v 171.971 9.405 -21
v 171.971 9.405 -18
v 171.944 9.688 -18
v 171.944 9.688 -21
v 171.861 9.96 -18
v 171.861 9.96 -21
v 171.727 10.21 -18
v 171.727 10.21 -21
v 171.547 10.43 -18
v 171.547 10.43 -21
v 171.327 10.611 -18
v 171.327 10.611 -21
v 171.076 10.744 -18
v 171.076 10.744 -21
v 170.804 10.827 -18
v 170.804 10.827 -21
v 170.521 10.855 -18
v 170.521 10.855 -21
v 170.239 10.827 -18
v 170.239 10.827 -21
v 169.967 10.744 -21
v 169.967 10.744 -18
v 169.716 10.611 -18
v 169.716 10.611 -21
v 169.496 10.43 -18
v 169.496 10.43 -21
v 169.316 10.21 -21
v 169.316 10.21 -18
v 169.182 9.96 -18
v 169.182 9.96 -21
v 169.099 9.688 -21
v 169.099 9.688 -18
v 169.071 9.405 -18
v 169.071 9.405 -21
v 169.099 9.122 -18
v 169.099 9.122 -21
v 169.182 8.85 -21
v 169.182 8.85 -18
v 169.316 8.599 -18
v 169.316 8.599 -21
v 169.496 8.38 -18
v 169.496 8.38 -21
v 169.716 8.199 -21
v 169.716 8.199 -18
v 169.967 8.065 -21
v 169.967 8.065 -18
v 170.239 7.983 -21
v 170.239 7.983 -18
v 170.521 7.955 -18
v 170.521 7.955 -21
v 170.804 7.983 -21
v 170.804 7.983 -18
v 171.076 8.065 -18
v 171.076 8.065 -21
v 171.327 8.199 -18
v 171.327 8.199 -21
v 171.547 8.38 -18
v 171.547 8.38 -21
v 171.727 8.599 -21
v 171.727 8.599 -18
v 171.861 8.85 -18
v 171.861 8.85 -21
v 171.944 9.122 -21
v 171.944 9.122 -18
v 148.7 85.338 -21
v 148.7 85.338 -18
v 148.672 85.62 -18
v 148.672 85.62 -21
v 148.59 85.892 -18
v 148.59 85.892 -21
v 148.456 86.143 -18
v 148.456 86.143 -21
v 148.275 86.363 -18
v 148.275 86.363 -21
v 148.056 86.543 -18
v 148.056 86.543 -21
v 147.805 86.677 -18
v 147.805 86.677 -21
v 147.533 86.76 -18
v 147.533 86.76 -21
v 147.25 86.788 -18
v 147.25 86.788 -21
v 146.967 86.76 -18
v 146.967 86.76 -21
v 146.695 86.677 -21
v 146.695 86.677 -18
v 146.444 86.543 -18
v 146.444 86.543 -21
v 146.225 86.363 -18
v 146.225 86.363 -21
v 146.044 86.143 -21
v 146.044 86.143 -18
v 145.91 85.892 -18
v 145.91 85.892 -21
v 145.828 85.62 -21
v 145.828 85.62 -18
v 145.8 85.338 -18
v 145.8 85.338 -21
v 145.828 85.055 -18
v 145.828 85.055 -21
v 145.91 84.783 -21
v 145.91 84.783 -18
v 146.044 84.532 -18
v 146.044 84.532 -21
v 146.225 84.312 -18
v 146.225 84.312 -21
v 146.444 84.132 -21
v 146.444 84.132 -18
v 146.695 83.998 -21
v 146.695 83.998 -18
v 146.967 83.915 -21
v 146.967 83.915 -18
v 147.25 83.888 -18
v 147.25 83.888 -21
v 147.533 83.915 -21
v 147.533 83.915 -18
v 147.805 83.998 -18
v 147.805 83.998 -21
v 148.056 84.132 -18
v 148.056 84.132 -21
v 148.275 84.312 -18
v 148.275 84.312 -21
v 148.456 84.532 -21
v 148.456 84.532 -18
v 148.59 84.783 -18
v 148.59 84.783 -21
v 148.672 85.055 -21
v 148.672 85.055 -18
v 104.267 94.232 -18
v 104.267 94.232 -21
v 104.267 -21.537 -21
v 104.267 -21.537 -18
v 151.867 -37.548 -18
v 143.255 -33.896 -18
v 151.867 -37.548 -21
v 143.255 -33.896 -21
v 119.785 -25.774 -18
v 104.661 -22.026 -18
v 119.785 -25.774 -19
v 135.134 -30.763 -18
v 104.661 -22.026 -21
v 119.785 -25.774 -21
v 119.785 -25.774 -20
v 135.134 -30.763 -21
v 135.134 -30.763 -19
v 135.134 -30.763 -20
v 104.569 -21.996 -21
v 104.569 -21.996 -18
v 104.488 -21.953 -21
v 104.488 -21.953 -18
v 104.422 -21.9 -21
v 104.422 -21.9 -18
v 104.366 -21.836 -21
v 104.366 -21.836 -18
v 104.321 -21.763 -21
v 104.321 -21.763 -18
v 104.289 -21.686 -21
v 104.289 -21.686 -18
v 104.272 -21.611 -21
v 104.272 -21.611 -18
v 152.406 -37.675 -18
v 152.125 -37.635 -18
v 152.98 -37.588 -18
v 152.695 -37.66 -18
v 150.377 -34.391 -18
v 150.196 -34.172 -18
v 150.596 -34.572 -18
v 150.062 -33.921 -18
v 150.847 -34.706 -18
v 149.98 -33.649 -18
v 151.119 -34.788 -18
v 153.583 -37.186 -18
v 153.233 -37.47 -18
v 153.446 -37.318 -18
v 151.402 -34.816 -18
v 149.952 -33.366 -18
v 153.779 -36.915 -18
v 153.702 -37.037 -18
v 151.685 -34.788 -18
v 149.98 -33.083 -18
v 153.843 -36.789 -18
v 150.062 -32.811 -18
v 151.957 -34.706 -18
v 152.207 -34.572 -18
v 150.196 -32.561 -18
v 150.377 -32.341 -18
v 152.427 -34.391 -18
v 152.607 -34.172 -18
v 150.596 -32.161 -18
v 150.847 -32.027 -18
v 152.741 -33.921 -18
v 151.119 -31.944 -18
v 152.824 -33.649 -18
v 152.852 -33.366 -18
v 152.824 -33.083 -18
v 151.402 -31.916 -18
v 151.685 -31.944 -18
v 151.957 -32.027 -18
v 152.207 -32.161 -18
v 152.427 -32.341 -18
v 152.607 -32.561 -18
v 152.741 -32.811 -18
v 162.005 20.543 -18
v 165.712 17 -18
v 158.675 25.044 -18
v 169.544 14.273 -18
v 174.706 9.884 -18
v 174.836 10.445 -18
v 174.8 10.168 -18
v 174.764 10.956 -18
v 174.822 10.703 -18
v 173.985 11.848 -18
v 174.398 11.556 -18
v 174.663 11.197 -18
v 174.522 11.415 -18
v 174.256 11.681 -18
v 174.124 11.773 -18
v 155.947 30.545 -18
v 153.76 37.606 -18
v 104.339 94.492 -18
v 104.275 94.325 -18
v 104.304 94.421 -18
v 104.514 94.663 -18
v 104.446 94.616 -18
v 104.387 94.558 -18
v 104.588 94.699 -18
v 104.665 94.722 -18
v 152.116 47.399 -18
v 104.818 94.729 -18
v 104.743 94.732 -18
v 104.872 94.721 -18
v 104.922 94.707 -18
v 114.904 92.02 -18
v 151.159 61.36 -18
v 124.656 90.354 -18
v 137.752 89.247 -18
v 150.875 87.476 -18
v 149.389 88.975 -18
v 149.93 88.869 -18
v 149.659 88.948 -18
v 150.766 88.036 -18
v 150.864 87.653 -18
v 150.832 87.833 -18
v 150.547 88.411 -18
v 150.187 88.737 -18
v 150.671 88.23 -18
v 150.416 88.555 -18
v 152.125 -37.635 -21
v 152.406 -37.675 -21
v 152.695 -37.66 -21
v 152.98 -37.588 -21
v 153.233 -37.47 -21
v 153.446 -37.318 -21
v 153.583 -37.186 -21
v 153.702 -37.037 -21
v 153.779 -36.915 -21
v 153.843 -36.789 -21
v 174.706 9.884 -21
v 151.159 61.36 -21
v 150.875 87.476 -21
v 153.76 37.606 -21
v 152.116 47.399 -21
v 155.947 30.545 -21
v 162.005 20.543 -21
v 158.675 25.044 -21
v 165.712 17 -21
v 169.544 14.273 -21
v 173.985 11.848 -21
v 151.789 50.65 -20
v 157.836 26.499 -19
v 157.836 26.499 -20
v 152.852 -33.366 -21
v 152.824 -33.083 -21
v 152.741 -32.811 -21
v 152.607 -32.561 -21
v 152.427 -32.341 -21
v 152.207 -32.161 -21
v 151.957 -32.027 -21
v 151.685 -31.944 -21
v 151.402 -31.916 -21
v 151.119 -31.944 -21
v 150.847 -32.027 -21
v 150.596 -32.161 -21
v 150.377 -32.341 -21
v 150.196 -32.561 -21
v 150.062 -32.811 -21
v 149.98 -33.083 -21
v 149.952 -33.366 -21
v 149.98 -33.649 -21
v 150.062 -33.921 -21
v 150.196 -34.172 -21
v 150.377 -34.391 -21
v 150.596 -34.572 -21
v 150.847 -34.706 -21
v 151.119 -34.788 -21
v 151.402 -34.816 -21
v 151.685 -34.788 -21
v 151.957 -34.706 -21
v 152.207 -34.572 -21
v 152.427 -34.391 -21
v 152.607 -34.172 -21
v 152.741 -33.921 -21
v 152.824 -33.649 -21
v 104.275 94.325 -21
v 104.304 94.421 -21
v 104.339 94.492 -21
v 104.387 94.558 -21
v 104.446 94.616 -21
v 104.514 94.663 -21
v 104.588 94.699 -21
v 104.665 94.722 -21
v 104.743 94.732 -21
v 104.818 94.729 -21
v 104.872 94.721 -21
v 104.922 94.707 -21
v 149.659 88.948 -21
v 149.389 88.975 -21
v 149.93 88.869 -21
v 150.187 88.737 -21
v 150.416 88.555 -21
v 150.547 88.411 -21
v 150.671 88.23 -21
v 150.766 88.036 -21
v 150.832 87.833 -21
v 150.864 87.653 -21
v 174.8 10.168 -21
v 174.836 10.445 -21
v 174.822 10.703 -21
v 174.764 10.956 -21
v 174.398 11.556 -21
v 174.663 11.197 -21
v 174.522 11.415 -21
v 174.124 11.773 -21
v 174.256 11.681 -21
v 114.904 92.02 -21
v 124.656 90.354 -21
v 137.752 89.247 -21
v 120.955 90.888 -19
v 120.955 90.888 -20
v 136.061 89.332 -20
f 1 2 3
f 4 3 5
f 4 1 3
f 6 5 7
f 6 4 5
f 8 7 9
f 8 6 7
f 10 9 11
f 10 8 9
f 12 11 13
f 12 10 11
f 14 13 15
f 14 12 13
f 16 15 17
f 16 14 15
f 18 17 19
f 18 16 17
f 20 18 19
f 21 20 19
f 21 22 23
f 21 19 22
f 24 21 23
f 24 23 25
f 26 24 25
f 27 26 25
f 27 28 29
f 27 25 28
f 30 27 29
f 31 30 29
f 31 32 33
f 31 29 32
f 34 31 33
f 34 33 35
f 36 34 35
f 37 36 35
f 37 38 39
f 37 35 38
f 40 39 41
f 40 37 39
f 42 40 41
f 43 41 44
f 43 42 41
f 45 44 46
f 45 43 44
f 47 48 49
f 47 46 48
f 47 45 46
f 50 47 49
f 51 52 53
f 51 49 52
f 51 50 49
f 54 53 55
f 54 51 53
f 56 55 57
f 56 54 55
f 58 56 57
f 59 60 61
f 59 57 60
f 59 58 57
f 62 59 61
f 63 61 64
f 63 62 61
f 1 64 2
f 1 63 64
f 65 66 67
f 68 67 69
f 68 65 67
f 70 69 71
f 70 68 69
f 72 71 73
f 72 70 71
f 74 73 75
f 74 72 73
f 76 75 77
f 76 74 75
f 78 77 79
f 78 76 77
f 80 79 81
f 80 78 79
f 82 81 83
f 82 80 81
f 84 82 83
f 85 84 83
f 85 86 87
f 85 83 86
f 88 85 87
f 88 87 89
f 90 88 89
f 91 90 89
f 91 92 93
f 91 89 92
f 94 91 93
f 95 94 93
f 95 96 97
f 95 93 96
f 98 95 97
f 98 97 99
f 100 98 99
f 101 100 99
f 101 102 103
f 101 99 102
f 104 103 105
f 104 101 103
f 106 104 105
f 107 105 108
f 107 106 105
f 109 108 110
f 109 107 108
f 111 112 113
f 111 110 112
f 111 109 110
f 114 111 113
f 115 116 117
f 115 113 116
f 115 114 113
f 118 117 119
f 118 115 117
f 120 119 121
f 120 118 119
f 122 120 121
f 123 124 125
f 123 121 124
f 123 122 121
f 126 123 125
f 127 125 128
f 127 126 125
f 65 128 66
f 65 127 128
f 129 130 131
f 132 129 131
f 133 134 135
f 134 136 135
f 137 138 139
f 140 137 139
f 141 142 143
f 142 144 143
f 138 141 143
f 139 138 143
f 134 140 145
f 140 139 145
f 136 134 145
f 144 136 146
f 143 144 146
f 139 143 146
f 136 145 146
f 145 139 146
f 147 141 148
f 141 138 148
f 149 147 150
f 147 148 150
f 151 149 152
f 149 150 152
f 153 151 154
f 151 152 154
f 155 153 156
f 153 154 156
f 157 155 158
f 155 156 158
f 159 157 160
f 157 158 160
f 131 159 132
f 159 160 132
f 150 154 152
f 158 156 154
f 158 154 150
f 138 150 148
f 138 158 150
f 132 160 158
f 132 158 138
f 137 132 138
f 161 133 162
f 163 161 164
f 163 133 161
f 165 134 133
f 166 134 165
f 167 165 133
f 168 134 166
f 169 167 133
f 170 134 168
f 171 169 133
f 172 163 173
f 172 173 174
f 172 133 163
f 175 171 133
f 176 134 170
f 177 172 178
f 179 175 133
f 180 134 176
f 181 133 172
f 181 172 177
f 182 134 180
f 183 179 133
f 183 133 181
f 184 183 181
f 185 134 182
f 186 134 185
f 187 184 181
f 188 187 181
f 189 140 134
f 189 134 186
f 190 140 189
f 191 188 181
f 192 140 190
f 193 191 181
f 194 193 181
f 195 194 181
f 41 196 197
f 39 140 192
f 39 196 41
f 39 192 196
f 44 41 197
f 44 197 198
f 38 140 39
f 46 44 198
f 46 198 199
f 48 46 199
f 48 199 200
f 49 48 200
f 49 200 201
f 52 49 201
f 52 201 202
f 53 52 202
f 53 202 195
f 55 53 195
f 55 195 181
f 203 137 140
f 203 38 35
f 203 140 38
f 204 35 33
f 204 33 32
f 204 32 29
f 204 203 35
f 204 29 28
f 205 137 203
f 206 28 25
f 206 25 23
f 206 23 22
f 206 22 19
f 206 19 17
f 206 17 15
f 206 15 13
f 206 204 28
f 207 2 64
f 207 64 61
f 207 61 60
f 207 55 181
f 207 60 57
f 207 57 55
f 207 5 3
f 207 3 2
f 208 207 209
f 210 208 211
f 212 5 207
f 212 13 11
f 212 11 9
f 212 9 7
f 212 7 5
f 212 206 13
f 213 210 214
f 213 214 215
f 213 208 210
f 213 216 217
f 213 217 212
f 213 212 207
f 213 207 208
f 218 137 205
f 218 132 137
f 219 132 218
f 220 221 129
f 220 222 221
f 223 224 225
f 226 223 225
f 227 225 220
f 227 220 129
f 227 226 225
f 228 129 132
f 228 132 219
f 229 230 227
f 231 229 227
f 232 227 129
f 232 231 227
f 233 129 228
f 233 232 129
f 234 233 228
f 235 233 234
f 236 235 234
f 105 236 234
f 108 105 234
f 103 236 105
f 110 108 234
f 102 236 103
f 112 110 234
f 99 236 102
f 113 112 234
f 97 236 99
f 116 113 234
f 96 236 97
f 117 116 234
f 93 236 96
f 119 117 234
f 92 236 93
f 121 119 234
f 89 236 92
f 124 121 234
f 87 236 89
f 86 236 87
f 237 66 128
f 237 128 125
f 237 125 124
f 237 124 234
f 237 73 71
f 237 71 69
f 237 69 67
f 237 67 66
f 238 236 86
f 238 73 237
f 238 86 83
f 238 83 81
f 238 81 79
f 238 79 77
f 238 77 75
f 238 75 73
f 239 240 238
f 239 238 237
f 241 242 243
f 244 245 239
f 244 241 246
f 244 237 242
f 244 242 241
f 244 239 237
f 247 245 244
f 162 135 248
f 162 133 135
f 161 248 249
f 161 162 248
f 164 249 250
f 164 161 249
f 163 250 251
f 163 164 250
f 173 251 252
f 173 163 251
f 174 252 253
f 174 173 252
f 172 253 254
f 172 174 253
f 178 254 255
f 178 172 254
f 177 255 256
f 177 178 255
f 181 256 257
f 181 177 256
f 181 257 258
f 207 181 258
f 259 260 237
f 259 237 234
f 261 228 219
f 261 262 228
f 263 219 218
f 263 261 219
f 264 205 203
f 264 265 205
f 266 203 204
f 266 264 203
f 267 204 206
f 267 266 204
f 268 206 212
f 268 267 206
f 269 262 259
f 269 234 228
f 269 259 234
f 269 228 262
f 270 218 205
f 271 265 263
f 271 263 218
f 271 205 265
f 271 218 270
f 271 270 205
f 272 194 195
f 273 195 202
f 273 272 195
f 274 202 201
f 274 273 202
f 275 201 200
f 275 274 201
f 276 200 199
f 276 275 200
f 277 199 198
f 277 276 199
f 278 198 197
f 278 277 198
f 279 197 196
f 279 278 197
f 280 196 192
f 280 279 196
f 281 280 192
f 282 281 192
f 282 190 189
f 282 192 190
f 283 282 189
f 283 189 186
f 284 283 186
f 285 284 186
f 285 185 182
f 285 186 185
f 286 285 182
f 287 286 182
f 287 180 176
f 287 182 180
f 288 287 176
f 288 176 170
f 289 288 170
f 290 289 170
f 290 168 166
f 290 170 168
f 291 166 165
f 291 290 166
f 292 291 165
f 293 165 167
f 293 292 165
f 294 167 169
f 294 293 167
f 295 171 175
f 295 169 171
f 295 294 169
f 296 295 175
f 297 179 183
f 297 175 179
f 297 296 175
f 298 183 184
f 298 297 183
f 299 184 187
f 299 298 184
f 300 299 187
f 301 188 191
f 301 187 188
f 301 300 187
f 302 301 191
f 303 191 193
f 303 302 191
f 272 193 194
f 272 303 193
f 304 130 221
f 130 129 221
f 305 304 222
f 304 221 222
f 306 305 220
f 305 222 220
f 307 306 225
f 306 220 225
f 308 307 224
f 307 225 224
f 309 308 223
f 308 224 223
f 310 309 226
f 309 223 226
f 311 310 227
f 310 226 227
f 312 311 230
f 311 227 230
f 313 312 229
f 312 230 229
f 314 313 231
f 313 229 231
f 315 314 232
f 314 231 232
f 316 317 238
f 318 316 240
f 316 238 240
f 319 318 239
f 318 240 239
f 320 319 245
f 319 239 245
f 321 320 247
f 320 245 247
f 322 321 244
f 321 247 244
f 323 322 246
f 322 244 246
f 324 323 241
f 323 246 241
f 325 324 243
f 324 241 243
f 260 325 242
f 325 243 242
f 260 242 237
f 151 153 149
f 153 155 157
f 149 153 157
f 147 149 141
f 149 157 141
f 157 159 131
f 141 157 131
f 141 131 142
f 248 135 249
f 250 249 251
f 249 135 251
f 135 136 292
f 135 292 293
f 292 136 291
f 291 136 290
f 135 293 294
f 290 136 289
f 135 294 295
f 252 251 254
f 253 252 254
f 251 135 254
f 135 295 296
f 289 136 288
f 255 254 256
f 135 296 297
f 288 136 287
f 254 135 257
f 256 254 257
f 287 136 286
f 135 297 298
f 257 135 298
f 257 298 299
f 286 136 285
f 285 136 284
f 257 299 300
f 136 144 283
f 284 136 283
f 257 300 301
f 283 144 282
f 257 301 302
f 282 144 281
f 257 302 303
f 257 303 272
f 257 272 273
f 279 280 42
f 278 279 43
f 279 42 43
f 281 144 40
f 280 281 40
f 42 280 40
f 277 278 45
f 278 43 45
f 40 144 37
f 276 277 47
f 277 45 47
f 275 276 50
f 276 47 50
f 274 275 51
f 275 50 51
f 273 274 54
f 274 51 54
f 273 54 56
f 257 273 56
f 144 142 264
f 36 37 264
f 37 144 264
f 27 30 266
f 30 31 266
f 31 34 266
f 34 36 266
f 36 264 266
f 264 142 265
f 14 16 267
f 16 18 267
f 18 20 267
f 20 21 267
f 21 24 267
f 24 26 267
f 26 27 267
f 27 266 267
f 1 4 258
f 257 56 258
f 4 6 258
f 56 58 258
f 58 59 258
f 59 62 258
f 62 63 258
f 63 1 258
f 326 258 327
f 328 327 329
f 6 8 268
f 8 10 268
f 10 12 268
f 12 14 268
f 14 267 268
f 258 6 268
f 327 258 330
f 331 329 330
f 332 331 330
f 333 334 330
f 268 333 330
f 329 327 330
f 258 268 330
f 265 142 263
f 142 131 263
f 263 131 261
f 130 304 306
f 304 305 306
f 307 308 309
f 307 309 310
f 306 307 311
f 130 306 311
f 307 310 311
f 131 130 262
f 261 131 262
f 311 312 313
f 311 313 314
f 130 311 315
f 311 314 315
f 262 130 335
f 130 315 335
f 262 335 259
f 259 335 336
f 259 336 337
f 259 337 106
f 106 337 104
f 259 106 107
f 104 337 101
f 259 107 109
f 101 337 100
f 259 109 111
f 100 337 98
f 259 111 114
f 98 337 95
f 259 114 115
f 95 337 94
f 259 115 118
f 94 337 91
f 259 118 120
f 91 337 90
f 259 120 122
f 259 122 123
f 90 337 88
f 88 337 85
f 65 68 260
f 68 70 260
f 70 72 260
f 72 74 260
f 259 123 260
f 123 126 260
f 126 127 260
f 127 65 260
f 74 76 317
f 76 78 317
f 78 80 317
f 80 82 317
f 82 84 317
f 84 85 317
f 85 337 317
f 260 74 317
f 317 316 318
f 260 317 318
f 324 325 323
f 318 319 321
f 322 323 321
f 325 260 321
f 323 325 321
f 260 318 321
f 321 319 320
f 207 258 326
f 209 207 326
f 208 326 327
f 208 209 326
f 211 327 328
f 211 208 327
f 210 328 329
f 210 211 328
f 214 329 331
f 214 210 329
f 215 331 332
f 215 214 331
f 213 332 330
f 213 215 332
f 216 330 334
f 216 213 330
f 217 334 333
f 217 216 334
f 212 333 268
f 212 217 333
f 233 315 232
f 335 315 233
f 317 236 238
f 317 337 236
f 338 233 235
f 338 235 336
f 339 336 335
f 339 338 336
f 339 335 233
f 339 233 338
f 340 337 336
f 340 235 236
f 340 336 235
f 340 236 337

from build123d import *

# Parameters (mm, degrees)
PAD011_DEPTH    = 3
SKETCH046_R     = 1.45
POCKET014_DEPTH = 27
FILLET009_R     = 1.5
FILLET017_R     = 0.5


with BuildPart() as part:
    # Sketch035 → Pad011 (new body)
    with BuildSketch(Plane.XY):
        with BuildLine():
            add(Edge.make_bspline(
                [(104.266667, -21.941284), (120.21302, -25.349195), (134.610356, -29.830731), (153.231854, -38.154949)],
                knots=[0, 0, 0, 0, 1, 1, 1, 1], degree=3))
            Line((153.231854, -38.154949), (175.310198, 11.234895))
            add(Edge.make_bspline(
                [(150.875, 88.9625), (150.875, 42.8625), (150.875, 22.157965), (175.310198, 11.234895)],
                knots=[0, 0, 0, 0, 1, 1, 1, 1], degree=3))
            add(Edge.make_bspline(
                [(104.266667, 94.924515), (121.368889, 89.186974), (138.406555, 89.068954), (150.875, 88.9625)],
                knots=[0, 0, 0, 0, 1, 1, 1, 1], degree=3))
            Line((104.266667, 94.924515), (104.266667, -21.941284))
        make_face()
    extrude(amount=PAD011_DEPTH)

    # Sketch046 → Pocket014 (cut)
    with BuildSketch(Plane.XY):
        with Locations((-4.375, -4.375)):
            Circle(SKETCH046_R)
        with Locations((-4.375, 80.575)):
            Circle(SKETCH046_R)
        with Locations((151.401832, -33.366184)):
            Circle(SKETCH046_R)
        with Locations((170.521433, 9.404873)):
            Circle(SKETCH046_R)
        with Locations((147.25, 85.3375)):
            Circle(SKETCH046_R)
        with Locations((43.25, -13.9)):
            Circle(SKETCH046_R)
        with Locations((57.15, 92.085)):
            Circle(SKETCH046_R)
        with Locations((95.25, 92.085)):
            Circle(SKETCH046_R)
        with Locations((95.25, -13.9)):
            Circle(SKETCH046_R)
    extrude(amount=POCKET014_DEPTH, mode=Mode.SUBTRACT)

    # Fillet009
    fillet009_edges = [part.edges().sort_by_distance(p)[0] for p in [
        (153.231854, -38.154949, 1.5),
        (175.310198, 11.234895, 1.5),
        (150.875, 88.9625, 1.5),
    ]]
    fillet(fillet009_edges, radius=FILLET009_R)

    # Fillet017
    fillet017_edges = [part.edges().sort_by_distance(p)[0] for p in [
        (104.266667, 94.924515, 1.5),
        (104.266667, -21.941284, 1.5),
    ]]
    fillet(fillet017_edges, radius=FILLET017_R)


with BuildPart() as part_1:
    # Body010 placement: moved
    add(part.part.moved(Location((0, 0, -21))))


solid = part_1.part
